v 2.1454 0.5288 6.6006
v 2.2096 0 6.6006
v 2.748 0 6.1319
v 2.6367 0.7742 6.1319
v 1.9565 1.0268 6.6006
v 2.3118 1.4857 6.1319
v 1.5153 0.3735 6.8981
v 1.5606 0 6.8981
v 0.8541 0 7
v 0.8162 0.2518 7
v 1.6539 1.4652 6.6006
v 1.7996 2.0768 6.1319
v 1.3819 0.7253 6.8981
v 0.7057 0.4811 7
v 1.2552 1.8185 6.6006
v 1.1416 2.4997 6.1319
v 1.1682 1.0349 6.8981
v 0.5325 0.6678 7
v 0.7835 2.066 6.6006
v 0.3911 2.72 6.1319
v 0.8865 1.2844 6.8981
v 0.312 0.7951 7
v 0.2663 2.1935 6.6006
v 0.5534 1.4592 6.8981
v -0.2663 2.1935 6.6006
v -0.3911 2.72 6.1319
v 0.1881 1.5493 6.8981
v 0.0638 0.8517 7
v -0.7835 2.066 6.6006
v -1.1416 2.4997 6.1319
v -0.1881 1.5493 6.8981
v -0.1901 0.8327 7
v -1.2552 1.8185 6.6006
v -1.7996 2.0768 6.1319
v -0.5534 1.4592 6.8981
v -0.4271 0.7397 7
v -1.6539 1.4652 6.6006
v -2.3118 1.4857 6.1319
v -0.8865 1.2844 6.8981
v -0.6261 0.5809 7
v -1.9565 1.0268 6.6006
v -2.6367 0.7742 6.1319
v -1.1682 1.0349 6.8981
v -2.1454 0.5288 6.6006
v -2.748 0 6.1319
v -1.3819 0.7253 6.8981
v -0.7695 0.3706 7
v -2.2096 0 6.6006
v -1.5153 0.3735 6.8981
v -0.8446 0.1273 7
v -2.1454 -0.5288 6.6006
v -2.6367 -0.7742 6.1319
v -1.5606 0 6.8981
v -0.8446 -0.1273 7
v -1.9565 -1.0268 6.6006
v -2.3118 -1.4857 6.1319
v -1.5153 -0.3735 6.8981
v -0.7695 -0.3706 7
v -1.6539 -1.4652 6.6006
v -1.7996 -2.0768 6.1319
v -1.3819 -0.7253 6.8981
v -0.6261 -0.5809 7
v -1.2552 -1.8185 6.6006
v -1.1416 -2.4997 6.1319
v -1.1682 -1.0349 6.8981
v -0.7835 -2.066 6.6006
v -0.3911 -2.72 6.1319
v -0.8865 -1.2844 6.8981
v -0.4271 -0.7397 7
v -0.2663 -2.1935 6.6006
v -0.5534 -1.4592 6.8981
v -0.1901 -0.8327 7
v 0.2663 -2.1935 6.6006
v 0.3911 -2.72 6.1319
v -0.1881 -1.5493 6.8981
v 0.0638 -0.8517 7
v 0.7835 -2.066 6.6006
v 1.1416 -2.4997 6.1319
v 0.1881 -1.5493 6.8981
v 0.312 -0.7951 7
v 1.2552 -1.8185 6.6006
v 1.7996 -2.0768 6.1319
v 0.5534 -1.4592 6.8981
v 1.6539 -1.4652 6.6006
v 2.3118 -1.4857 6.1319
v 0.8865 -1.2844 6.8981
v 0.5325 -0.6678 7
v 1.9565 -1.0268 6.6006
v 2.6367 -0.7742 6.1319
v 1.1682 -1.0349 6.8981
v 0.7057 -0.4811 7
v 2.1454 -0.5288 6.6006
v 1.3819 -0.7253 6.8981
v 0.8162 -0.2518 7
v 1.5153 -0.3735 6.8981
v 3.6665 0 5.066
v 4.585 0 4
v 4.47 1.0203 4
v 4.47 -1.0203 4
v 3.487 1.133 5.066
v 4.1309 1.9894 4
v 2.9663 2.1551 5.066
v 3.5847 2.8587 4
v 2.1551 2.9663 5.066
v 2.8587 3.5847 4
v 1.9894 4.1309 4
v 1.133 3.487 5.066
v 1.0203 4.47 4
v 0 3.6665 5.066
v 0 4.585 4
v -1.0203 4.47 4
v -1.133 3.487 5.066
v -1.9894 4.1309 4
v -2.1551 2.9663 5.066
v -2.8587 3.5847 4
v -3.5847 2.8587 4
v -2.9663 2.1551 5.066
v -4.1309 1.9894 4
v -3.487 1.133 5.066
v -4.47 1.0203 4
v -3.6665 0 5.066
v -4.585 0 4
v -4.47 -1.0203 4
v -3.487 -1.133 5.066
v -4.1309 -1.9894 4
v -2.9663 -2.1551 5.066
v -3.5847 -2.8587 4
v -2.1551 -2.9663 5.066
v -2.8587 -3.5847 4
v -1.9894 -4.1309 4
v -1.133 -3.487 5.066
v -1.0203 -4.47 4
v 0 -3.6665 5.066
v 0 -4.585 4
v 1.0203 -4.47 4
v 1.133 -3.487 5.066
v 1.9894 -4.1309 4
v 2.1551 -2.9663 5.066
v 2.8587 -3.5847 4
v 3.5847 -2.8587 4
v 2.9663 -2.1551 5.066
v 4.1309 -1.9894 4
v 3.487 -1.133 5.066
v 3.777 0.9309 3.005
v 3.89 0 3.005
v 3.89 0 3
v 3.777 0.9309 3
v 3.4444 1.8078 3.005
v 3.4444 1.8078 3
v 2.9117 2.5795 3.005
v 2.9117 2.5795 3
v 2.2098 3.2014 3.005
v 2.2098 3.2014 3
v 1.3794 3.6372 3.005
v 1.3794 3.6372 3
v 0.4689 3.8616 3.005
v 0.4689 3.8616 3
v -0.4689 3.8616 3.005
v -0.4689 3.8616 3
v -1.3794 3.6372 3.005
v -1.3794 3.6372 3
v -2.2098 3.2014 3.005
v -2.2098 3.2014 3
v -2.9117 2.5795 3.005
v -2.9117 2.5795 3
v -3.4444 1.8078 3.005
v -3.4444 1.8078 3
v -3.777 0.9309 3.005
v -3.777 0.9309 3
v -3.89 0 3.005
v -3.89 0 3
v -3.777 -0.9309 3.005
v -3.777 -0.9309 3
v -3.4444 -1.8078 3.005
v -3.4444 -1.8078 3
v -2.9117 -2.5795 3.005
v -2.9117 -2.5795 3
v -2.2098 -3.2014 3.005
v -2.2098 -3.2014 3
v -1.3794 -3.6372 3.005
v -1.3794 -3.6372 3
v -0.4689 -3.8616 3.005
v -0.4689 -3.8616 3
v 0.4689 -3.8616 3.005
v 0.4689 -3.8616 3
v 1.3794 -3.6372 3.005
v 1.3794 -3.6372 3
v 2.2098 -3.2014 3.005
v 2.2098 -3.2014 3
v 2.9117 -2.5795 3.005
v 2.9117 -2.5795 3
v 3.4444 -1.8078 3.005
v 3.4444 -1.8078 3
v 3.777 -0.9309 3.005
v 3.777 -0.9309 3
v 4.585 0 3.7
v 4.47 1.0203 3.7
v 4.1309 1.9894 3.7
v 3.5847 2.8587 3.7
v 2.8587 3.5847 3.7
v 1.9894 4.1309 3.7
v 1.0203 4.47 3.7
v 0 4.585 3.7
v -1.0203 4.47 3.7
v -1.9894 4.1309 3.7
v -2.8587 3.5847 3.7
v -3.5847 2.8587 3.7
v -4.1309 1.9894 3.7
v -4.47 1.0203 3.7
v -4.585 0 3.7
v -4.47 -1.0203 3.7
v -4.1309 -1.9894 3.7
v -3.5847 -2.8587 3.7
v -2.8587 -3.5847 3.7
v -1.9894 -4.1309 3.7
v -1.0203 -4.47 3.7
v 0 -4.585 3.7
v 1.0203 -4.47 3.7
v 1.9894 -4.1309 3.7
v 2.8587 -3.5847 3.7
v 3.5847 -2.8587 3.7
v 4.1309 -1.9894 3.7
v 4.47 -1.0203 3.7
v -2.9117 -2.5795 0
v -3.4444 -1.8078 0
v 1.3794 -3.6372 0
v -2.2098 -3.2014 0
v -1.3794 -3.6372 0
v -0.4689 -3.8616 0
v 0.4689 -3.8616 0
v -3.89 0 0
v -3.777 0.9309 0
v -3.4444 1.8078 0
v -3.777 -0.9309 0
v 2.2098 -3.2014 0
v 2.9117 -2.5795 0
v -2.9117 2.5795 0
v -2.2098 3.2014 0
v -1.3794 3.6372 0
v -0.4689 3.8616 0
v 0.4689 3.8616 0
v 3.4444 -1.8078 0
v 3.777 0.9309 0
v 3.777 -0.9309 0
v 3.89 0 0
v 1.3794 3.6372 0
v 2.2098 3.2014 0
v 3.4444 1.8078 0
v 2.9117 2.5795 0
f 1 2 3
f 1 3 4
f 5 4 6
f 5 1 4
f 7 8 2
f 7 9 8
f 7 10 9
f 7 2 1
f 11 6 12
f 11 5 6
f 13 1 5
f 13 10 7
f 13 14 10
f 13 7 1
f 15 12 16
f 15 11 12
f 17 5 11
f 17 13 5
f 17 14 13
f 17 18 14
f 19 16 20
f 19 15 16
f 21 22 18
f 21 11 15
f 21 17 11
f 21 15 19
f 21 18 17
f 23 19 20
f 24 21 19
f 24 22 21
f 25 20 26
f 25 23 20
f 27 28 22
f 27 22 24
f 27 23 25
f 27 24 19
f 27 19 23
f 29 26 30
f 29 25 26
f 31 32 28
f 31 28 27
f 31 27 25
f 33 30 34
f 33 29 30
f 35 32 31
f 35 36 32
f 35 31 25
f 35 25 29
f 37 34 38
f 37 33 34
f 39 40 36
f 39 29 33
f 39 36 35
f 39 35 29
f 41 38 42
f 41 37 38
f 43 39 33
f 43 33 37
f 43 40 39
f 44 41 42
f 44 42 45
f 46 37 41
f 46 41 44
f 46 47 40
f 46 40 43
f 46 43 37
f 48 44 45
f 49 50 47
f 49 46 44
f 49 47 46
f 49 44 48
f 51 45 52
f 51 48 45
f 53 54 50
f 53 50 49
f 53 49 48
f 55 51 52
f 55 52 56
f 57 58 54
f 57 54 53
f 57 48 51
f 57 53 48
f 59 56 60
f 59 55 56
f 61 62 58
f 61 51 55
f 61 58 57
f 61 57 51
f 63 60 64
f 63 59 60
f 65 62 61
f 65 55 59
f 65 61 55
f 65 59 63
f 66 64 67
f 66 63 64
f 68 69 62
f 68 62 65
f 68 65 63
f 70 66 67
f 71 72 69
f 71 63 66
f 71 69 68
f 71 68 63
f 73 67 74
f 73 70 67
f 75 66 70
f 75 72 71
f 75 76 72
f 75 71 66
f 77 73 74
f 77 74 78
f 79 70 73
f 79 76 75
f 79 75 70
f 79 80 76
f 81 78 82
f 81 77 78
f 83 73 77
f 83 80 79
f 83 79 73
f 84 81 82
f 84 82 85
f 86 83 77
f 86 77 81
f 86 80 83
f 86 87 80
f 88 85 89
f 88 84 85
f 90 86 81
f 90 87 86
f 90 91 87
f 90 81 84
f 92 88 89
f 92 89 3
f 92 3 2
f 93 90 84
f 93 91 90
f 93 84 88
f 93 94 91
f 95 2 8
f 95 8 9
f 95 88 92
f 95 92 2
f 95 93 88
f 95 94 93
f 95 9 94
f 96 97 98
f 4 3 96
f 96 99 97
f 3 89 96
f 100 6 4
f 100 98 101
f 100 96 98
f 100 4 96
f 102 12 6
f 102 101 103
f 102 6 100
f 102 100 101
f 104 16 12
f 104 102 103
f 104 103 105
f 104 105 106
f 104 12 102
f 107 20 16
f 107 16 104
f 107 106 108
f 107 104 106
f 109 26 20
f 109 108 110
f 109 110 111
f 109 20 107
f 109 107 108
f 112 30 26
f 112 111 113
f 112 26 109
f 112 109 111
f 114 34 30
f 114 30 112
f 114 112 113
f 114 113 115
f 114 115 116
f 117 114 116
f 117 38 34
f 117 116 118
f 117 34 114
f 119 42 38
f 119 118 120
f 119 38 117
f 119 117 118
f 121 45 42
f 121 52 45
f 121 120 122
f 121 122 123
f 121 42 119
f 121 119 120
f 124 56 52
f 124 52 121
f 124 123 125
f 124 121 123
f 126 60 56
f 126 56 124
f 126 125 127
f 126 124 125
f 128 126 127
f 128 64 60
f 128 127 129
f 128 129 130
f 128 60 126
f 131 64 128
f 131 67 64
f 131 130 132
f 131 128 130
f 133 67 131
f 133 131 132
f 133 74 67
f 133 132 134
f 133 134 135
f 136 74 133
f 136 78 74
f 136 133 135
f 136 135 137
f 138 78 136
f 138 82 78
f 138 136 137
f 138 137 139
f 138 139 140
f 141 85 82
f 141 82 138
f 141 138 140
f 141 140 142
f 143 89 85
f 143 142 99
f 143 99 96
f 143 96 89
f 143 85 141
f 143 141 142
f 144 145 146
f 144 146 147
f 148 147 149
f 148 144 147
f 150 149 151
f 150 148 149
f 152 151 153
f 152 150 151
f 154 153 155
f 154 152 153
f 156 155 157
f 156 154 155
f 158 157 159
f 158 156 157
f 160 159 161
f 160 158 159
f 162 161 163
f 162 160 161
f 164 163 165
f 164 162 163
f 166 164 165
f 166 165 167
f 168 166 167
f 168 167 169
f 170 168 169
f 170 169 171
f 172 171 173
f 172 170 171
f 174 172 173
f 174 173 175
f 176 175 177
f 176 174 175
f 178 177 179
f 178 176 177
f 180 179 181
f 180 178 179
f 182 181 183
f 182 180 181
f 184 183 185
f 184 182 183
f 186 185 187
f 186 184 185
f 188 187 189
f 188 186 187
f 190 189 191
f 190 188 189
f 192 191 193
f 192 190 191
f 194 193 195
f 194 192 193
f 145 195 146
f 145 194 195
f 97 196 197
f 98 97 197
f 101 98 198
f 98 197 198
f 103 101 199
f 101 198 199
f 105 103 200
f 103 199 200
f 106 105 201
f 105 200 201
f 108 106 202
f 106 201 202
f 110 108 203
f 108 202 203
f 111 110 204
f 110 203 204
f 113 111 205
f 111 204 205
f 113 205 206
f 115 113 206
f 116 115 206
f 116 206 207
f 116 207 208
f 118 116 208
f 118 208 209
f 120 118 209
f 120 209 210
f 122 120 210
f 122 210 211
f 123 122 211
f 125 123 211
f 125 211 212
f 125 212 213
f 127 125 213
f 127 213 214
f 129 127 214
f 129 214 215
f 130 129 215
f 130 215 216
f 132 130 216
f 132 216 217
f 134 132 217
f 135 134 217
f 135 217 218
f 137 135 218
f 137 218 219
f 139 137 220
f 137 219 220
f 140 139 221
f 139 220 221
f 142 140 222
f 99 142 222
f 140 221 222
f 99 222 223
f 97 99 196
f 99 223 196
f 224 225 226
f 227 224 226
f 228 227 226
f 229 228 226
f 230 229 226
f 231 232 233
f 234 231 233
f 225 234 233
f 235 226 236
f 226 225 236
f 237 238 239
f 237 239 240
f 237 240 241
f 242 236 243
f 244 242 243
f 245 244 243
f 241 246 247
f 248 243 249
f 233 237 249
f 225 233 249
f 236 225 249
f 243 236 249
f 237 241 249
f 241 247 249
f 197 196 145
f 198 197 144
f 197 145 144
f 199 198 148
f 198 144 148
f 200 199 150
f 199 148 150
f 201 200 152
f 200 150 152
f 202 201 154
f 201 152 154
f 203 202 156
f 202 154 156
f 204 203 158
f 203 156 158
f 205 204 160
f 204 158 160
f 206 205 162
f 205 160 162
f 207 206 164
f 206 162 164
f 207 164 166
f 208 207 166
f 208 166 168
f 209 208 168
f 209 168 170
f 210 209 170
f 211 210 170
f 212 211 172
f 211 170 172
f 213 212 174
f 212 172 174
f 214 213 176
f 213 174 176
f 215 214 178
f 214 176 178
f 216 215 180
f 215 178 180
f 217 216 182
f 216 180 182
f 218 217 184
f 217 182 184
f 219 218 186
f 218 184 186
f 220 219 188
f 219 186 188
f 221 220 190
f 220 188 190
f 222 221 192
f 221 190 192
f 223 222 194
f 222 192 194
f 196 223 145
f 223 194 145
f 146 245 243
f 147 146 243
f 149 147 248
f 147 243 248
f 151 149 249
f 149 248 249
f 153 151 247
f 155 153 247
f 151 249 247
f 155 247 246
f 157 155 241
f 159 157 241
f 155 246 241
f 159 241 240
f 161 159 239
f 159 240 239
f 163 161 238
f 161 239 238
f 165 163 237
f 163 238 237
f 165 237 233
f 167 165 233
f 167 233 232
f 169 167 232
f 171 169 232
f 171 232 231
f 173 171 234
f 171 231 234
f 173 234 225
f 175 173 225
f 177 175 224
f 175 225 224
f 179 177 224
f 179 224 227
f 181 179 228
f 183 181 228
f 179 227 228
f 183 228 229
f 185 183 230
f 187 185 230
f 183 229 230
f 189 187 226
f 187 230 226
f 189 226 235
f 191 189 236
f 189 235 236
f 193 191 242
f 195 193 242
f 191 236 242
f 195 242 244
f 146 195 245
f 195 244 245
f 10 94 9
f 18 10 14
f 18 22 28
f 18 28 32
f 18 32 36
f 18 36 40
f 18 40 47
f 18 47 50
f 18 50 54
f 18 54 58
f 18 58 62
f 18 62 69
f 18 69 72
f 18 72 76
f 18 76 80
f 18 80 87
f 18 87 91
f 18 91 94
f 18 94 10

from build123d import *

# Parameters (mm, degrees)
F0_R        = 3.89
F1_DEPTH    = 3
F2_R        = 4.585
F2_R_2      = 3.89
F5_DEPTH    = 1
F5_FACE_R   = 4.585
F4_R        = 2
F7_R        = 2.5
F8_S5_R     = 3.89
F8_T6_DEPTH = 8


# Not quite as in the source:
# - a fillet or chamfer that OpenCascade refuses, or shapes differently, is made with other operations: its cross-section is extruded or revolved along the edge and cut away or added


with BuildPart() as f1:
    # F0 (on Top) → F1 (new body)
    with BuildSketch(Plane.XY):
        Circle(F0_R)
    extrude(amount=F1_DEPTH)

    # F2 (on face) → F5 (join)
    with BuildSketch(Plane.XY.offset(3)):
        Circle(F2_R)
        Circle(F2_R_2, mode=Mode.SUBTRACT)
        Circle(F2_R_2)
    extrude(amount=F5_DEPTH)

    # F5_face (on face) → F6 section 0
    with BuildSketch(Plane.XY.offset(4)):
        Circle(F5_FACE_R)
    # F4 (on offset) → F6 section 1
    with BuildSketch(Plane.XY.offset(7)):
        Circle(F4_R)
    loft()

    # F7
    f7_edges = [f1.edges().sort_by_distance(p)[0] for p in [
        (-2, 0, 7),
    ]]
    fillet(f7_edges, radius=F7_R)

    # F8: chamfer of 0.7 on 1 edges, made by hand


with BuildPart() as f8_tool2:
    # F8_s3 → F8_t4 (revolve)
    with BuildSketch(Plane.XZ):
        Polygon((4.585, 3.7), (3.885, 3), (4.585, 3), align=None)
    revolve(axis=Axis((0, 0, 3), (0, 0, 1)))

    # F8_s5 → F8_t6 (cut, symmetric)
    with BuildSketch(Plane.XY.offset(3.4)):
        Circle(F8_S5_R)
    extrude(amount=F8_T6_DEPTH, both=True, mode=Mode.SUBTRACT)


with BuildPart() as f1_1:
    add(f1.part)

    # F8_t1: cut F8_tool2
    add(f8_tool2.part, mode=Mode.SUBTRACT)


solid = f1_1.part
